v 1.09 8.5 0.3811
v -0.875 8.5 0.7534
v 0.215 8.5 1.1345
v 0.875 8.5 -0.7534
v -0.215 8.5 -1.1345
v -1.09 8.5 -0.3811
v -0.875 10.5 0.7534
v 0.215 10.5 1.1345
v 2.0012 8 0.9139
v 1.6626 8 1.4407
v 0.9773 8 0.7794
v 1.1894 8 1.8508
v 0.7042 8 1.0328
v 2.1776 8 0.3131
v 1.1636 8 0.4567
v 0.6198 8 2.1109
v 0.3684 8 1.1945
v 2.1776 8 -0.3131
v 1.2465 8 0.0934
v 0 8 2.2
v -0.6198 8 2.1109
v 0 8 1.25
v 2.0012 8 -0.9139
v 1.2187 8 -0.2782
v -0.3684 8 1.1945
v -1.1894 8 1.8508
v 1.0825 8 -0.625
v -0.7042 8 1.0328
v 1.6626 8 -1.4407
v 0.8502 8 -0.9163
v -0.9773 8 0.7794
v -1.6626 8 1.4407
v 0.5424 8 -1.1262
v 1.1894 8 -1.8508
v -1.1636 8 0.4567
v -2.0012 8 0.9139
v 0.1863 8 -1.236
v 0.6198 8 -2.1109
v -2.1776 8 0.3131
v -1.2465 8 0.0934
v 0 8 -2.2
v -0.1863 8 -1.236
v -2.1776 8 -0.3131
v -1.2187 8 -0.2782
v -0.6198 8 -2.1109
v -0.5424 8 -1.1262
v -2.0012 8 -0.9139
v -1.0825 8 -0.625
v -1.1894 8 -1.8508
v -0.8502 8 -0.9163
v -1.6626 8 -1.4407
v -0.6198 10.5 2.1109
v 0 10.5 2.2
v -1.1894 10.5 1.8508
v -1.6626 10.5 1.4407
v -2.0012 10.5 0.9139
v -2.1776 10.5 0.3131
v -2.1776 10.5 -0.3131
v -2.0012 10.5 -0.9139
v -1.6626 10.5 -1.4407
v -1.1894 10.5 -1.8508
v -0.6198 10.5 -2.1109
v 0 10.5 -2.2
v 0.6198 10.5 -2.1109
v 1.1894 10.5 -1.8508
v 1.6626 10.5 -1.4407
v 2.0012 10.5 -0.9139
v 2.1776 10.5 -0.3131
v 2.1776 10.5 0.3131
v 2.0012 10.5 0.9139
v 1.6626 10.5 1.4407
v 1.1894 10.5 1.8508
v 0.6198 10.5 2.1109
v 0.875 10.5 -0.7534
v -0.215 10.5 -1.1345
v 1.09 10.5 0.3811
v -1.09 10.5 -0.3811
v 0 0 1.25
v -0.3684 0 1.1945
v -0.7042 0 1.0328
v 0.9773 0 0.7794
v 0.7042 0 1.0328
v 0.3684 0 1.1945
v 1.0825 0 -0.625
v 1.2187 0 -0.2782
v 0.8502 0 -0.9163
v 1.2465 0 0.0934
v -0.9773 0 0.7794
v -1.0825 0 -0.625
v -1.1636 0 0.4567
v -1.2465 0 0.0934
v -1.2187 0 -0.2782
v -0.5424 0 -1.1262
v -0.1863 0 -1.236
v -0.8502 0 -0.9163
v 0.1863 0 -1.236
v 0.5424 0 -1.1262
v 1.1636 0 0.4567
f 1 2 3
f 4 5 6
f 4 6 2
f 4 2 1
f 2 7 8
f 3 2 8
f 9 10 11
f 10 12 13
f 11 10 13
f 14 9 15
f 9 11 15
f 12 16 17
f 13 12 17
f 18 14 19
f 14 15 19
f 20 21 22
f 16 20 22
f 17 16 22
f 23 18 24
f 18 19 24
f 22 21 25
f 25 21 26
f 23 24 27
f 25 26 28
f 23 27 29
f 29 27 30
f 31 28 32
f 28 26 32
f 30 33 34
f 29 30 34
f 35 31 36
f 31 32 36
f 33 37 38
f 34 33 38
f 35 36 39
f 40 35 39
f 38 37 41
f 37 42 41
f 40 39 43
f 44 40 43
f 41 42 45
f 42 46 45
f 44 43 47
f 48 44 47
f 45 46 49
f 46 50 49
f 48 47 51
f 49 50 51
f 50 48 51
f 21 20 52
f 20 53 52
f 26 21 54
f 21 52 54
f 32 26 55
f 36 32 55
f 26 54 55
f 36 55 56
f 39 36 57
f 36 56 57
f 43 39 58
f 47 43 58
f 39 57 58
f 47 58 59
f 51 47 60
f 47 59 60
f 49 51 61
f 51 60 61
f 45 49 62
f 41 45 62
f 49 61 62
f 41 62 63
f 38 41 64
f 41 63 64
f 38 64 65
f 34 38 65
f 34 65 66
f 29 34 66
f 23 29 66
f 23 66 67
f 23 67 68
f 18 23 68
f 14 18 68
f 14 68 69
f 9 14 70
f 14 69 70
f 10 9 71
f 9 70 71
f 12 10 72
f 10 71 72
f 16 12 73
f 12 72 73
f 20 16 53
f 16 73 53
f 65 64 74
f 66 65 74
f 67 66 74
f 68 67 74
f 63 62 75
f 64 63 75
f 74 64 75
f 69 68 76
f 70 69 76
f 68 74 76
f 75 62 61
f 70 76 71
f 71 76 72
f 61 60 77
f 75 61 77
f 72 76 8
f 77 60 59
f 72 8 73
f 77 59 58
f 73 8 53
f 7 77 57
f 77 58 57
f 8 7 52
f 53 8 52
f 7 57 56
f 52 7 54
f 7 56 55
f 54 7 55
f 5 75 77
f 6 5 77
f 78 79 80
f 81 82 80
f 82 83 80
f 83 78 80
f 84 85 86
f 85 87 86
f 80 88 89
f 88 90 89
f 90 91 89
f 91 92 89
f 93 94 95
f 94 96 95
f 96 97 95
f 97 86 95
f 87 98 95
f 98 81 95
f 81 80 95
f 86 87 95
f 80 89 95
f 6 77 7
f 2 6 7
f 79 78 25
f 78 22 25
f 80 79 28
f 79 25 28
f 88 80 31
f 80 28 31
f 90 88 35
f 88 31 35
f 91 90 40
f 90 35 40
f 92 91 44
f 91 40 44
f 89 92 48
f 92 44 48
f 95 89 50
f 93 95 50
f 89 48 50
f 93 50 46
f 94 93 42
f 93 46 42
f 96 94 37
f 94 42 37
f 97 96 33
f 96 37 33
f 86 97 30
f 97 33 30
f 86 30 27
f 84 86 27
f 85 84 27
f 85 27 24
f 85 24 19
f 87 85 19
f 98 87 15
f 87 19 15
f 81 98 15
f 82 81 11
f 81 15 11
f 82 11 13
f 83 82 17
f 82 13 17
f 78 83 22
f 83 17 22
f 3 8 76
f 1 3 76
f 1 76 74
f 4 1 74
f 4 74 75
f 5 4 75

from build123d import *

# Parameters (mm, degrees)
CORTAR_EXTRUIR1_DEPTH = 2


with BuildPart() as part:
    # Croquis1 → Revolución1 (revolve)
    with BuildSketch(Plane.XY, mode=Mode.PRIVATE) as revoluci_n1_sk:
        Polygon((0, 0), (-1.25, 0), (-1.25, 8), (-2.2, 8), (-2.2, 10.5), (-0.840646635, 10.5), (-0.840646635, 8.822225361), (0, 8.822225361), align=None)
    revolve(revoluci_n1_sk.sketch.rotate(Axis((0, 8.822225361, 0), (0, -1, 0)), 270), axis=Axis((0, 8.822225361, 0), (0, -1, 0)))

    # Croquis2 → Cortar-Extruir1 (cut)
    with BuildSketch(Plane(origin=(0, 10.5, 0), x_dir=(1, 0, 0), z_dir=(0, 1, 0))):
        Polygon((0.875027781, 0.753431958), (-0.214977325, 1.134512267), (-1.090005106, 0.381080309), (-0.875027781, -0.753431958), (0.214977325, -1.134512267), (1.090005106, -0.381080309), align=None)
    extrude(amount=-CORTAR_EXTRUIR1_DEPTH, mode=Mode.SUBTRACT)


solid = part.part
